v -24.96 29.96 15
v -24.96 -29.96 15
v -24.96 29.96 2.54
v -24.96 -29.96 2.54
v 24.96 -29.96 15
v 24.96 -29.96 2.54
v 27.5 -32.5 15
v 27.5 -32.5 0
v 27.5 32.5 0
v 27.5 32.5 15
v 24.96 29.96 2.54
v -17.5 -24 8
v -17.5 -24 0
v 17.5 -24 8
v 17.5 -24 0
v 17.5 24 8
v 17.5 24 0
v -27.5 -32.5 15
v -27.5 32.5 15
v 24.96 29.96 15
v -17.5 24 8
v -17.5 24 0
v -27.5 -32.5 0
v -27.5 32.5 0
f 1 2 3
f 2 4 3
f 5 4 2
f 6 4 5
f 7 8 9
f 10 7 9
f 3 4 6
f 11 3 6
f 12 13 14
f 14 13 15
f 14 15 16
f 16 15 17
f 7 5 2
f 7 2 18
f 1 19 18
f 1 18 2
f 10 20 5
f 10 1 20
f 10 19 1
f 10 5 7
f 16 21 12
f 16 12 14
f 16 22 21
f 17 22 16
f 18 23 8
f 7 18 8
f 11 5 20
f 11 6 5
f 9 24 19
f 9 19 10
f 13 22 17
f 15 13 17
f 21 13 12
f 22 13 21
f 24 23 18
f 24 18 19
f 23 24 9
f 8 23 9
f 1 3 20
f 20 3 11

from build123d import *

# Parameters (mm, degrees)
F0_W     = 55
F0_H     = 65
F1_DEPTH = 15
F2_T     = -2.54
F3_W     = 35
F3_H     = 48
F4_DEPTH = 8


with BuildPart() as f1:
    # F0 (on Top) → F1 (new body)
    with BuildSketch(Plane.XY):
        Rectangle(F0_W, F0_H)
    extrude(amount=F1_DEPTH)

    # F2
    f2_openings = [f1.faces().sort_by_distance(p)[0] for p in [
        (0, 0, 15),
    ]]
    offset(amount=F2_T, openings=f2_openings)


with BuildPart() as f4:
    # F3 (on Top) → F4 (new body)
    with BuildSketch(Plane.XY):
        Rectangle(F3_W, F3_H)
    extrude(amount=F4_DEPTH)


solid = Compound([f1.part, f4.part])
